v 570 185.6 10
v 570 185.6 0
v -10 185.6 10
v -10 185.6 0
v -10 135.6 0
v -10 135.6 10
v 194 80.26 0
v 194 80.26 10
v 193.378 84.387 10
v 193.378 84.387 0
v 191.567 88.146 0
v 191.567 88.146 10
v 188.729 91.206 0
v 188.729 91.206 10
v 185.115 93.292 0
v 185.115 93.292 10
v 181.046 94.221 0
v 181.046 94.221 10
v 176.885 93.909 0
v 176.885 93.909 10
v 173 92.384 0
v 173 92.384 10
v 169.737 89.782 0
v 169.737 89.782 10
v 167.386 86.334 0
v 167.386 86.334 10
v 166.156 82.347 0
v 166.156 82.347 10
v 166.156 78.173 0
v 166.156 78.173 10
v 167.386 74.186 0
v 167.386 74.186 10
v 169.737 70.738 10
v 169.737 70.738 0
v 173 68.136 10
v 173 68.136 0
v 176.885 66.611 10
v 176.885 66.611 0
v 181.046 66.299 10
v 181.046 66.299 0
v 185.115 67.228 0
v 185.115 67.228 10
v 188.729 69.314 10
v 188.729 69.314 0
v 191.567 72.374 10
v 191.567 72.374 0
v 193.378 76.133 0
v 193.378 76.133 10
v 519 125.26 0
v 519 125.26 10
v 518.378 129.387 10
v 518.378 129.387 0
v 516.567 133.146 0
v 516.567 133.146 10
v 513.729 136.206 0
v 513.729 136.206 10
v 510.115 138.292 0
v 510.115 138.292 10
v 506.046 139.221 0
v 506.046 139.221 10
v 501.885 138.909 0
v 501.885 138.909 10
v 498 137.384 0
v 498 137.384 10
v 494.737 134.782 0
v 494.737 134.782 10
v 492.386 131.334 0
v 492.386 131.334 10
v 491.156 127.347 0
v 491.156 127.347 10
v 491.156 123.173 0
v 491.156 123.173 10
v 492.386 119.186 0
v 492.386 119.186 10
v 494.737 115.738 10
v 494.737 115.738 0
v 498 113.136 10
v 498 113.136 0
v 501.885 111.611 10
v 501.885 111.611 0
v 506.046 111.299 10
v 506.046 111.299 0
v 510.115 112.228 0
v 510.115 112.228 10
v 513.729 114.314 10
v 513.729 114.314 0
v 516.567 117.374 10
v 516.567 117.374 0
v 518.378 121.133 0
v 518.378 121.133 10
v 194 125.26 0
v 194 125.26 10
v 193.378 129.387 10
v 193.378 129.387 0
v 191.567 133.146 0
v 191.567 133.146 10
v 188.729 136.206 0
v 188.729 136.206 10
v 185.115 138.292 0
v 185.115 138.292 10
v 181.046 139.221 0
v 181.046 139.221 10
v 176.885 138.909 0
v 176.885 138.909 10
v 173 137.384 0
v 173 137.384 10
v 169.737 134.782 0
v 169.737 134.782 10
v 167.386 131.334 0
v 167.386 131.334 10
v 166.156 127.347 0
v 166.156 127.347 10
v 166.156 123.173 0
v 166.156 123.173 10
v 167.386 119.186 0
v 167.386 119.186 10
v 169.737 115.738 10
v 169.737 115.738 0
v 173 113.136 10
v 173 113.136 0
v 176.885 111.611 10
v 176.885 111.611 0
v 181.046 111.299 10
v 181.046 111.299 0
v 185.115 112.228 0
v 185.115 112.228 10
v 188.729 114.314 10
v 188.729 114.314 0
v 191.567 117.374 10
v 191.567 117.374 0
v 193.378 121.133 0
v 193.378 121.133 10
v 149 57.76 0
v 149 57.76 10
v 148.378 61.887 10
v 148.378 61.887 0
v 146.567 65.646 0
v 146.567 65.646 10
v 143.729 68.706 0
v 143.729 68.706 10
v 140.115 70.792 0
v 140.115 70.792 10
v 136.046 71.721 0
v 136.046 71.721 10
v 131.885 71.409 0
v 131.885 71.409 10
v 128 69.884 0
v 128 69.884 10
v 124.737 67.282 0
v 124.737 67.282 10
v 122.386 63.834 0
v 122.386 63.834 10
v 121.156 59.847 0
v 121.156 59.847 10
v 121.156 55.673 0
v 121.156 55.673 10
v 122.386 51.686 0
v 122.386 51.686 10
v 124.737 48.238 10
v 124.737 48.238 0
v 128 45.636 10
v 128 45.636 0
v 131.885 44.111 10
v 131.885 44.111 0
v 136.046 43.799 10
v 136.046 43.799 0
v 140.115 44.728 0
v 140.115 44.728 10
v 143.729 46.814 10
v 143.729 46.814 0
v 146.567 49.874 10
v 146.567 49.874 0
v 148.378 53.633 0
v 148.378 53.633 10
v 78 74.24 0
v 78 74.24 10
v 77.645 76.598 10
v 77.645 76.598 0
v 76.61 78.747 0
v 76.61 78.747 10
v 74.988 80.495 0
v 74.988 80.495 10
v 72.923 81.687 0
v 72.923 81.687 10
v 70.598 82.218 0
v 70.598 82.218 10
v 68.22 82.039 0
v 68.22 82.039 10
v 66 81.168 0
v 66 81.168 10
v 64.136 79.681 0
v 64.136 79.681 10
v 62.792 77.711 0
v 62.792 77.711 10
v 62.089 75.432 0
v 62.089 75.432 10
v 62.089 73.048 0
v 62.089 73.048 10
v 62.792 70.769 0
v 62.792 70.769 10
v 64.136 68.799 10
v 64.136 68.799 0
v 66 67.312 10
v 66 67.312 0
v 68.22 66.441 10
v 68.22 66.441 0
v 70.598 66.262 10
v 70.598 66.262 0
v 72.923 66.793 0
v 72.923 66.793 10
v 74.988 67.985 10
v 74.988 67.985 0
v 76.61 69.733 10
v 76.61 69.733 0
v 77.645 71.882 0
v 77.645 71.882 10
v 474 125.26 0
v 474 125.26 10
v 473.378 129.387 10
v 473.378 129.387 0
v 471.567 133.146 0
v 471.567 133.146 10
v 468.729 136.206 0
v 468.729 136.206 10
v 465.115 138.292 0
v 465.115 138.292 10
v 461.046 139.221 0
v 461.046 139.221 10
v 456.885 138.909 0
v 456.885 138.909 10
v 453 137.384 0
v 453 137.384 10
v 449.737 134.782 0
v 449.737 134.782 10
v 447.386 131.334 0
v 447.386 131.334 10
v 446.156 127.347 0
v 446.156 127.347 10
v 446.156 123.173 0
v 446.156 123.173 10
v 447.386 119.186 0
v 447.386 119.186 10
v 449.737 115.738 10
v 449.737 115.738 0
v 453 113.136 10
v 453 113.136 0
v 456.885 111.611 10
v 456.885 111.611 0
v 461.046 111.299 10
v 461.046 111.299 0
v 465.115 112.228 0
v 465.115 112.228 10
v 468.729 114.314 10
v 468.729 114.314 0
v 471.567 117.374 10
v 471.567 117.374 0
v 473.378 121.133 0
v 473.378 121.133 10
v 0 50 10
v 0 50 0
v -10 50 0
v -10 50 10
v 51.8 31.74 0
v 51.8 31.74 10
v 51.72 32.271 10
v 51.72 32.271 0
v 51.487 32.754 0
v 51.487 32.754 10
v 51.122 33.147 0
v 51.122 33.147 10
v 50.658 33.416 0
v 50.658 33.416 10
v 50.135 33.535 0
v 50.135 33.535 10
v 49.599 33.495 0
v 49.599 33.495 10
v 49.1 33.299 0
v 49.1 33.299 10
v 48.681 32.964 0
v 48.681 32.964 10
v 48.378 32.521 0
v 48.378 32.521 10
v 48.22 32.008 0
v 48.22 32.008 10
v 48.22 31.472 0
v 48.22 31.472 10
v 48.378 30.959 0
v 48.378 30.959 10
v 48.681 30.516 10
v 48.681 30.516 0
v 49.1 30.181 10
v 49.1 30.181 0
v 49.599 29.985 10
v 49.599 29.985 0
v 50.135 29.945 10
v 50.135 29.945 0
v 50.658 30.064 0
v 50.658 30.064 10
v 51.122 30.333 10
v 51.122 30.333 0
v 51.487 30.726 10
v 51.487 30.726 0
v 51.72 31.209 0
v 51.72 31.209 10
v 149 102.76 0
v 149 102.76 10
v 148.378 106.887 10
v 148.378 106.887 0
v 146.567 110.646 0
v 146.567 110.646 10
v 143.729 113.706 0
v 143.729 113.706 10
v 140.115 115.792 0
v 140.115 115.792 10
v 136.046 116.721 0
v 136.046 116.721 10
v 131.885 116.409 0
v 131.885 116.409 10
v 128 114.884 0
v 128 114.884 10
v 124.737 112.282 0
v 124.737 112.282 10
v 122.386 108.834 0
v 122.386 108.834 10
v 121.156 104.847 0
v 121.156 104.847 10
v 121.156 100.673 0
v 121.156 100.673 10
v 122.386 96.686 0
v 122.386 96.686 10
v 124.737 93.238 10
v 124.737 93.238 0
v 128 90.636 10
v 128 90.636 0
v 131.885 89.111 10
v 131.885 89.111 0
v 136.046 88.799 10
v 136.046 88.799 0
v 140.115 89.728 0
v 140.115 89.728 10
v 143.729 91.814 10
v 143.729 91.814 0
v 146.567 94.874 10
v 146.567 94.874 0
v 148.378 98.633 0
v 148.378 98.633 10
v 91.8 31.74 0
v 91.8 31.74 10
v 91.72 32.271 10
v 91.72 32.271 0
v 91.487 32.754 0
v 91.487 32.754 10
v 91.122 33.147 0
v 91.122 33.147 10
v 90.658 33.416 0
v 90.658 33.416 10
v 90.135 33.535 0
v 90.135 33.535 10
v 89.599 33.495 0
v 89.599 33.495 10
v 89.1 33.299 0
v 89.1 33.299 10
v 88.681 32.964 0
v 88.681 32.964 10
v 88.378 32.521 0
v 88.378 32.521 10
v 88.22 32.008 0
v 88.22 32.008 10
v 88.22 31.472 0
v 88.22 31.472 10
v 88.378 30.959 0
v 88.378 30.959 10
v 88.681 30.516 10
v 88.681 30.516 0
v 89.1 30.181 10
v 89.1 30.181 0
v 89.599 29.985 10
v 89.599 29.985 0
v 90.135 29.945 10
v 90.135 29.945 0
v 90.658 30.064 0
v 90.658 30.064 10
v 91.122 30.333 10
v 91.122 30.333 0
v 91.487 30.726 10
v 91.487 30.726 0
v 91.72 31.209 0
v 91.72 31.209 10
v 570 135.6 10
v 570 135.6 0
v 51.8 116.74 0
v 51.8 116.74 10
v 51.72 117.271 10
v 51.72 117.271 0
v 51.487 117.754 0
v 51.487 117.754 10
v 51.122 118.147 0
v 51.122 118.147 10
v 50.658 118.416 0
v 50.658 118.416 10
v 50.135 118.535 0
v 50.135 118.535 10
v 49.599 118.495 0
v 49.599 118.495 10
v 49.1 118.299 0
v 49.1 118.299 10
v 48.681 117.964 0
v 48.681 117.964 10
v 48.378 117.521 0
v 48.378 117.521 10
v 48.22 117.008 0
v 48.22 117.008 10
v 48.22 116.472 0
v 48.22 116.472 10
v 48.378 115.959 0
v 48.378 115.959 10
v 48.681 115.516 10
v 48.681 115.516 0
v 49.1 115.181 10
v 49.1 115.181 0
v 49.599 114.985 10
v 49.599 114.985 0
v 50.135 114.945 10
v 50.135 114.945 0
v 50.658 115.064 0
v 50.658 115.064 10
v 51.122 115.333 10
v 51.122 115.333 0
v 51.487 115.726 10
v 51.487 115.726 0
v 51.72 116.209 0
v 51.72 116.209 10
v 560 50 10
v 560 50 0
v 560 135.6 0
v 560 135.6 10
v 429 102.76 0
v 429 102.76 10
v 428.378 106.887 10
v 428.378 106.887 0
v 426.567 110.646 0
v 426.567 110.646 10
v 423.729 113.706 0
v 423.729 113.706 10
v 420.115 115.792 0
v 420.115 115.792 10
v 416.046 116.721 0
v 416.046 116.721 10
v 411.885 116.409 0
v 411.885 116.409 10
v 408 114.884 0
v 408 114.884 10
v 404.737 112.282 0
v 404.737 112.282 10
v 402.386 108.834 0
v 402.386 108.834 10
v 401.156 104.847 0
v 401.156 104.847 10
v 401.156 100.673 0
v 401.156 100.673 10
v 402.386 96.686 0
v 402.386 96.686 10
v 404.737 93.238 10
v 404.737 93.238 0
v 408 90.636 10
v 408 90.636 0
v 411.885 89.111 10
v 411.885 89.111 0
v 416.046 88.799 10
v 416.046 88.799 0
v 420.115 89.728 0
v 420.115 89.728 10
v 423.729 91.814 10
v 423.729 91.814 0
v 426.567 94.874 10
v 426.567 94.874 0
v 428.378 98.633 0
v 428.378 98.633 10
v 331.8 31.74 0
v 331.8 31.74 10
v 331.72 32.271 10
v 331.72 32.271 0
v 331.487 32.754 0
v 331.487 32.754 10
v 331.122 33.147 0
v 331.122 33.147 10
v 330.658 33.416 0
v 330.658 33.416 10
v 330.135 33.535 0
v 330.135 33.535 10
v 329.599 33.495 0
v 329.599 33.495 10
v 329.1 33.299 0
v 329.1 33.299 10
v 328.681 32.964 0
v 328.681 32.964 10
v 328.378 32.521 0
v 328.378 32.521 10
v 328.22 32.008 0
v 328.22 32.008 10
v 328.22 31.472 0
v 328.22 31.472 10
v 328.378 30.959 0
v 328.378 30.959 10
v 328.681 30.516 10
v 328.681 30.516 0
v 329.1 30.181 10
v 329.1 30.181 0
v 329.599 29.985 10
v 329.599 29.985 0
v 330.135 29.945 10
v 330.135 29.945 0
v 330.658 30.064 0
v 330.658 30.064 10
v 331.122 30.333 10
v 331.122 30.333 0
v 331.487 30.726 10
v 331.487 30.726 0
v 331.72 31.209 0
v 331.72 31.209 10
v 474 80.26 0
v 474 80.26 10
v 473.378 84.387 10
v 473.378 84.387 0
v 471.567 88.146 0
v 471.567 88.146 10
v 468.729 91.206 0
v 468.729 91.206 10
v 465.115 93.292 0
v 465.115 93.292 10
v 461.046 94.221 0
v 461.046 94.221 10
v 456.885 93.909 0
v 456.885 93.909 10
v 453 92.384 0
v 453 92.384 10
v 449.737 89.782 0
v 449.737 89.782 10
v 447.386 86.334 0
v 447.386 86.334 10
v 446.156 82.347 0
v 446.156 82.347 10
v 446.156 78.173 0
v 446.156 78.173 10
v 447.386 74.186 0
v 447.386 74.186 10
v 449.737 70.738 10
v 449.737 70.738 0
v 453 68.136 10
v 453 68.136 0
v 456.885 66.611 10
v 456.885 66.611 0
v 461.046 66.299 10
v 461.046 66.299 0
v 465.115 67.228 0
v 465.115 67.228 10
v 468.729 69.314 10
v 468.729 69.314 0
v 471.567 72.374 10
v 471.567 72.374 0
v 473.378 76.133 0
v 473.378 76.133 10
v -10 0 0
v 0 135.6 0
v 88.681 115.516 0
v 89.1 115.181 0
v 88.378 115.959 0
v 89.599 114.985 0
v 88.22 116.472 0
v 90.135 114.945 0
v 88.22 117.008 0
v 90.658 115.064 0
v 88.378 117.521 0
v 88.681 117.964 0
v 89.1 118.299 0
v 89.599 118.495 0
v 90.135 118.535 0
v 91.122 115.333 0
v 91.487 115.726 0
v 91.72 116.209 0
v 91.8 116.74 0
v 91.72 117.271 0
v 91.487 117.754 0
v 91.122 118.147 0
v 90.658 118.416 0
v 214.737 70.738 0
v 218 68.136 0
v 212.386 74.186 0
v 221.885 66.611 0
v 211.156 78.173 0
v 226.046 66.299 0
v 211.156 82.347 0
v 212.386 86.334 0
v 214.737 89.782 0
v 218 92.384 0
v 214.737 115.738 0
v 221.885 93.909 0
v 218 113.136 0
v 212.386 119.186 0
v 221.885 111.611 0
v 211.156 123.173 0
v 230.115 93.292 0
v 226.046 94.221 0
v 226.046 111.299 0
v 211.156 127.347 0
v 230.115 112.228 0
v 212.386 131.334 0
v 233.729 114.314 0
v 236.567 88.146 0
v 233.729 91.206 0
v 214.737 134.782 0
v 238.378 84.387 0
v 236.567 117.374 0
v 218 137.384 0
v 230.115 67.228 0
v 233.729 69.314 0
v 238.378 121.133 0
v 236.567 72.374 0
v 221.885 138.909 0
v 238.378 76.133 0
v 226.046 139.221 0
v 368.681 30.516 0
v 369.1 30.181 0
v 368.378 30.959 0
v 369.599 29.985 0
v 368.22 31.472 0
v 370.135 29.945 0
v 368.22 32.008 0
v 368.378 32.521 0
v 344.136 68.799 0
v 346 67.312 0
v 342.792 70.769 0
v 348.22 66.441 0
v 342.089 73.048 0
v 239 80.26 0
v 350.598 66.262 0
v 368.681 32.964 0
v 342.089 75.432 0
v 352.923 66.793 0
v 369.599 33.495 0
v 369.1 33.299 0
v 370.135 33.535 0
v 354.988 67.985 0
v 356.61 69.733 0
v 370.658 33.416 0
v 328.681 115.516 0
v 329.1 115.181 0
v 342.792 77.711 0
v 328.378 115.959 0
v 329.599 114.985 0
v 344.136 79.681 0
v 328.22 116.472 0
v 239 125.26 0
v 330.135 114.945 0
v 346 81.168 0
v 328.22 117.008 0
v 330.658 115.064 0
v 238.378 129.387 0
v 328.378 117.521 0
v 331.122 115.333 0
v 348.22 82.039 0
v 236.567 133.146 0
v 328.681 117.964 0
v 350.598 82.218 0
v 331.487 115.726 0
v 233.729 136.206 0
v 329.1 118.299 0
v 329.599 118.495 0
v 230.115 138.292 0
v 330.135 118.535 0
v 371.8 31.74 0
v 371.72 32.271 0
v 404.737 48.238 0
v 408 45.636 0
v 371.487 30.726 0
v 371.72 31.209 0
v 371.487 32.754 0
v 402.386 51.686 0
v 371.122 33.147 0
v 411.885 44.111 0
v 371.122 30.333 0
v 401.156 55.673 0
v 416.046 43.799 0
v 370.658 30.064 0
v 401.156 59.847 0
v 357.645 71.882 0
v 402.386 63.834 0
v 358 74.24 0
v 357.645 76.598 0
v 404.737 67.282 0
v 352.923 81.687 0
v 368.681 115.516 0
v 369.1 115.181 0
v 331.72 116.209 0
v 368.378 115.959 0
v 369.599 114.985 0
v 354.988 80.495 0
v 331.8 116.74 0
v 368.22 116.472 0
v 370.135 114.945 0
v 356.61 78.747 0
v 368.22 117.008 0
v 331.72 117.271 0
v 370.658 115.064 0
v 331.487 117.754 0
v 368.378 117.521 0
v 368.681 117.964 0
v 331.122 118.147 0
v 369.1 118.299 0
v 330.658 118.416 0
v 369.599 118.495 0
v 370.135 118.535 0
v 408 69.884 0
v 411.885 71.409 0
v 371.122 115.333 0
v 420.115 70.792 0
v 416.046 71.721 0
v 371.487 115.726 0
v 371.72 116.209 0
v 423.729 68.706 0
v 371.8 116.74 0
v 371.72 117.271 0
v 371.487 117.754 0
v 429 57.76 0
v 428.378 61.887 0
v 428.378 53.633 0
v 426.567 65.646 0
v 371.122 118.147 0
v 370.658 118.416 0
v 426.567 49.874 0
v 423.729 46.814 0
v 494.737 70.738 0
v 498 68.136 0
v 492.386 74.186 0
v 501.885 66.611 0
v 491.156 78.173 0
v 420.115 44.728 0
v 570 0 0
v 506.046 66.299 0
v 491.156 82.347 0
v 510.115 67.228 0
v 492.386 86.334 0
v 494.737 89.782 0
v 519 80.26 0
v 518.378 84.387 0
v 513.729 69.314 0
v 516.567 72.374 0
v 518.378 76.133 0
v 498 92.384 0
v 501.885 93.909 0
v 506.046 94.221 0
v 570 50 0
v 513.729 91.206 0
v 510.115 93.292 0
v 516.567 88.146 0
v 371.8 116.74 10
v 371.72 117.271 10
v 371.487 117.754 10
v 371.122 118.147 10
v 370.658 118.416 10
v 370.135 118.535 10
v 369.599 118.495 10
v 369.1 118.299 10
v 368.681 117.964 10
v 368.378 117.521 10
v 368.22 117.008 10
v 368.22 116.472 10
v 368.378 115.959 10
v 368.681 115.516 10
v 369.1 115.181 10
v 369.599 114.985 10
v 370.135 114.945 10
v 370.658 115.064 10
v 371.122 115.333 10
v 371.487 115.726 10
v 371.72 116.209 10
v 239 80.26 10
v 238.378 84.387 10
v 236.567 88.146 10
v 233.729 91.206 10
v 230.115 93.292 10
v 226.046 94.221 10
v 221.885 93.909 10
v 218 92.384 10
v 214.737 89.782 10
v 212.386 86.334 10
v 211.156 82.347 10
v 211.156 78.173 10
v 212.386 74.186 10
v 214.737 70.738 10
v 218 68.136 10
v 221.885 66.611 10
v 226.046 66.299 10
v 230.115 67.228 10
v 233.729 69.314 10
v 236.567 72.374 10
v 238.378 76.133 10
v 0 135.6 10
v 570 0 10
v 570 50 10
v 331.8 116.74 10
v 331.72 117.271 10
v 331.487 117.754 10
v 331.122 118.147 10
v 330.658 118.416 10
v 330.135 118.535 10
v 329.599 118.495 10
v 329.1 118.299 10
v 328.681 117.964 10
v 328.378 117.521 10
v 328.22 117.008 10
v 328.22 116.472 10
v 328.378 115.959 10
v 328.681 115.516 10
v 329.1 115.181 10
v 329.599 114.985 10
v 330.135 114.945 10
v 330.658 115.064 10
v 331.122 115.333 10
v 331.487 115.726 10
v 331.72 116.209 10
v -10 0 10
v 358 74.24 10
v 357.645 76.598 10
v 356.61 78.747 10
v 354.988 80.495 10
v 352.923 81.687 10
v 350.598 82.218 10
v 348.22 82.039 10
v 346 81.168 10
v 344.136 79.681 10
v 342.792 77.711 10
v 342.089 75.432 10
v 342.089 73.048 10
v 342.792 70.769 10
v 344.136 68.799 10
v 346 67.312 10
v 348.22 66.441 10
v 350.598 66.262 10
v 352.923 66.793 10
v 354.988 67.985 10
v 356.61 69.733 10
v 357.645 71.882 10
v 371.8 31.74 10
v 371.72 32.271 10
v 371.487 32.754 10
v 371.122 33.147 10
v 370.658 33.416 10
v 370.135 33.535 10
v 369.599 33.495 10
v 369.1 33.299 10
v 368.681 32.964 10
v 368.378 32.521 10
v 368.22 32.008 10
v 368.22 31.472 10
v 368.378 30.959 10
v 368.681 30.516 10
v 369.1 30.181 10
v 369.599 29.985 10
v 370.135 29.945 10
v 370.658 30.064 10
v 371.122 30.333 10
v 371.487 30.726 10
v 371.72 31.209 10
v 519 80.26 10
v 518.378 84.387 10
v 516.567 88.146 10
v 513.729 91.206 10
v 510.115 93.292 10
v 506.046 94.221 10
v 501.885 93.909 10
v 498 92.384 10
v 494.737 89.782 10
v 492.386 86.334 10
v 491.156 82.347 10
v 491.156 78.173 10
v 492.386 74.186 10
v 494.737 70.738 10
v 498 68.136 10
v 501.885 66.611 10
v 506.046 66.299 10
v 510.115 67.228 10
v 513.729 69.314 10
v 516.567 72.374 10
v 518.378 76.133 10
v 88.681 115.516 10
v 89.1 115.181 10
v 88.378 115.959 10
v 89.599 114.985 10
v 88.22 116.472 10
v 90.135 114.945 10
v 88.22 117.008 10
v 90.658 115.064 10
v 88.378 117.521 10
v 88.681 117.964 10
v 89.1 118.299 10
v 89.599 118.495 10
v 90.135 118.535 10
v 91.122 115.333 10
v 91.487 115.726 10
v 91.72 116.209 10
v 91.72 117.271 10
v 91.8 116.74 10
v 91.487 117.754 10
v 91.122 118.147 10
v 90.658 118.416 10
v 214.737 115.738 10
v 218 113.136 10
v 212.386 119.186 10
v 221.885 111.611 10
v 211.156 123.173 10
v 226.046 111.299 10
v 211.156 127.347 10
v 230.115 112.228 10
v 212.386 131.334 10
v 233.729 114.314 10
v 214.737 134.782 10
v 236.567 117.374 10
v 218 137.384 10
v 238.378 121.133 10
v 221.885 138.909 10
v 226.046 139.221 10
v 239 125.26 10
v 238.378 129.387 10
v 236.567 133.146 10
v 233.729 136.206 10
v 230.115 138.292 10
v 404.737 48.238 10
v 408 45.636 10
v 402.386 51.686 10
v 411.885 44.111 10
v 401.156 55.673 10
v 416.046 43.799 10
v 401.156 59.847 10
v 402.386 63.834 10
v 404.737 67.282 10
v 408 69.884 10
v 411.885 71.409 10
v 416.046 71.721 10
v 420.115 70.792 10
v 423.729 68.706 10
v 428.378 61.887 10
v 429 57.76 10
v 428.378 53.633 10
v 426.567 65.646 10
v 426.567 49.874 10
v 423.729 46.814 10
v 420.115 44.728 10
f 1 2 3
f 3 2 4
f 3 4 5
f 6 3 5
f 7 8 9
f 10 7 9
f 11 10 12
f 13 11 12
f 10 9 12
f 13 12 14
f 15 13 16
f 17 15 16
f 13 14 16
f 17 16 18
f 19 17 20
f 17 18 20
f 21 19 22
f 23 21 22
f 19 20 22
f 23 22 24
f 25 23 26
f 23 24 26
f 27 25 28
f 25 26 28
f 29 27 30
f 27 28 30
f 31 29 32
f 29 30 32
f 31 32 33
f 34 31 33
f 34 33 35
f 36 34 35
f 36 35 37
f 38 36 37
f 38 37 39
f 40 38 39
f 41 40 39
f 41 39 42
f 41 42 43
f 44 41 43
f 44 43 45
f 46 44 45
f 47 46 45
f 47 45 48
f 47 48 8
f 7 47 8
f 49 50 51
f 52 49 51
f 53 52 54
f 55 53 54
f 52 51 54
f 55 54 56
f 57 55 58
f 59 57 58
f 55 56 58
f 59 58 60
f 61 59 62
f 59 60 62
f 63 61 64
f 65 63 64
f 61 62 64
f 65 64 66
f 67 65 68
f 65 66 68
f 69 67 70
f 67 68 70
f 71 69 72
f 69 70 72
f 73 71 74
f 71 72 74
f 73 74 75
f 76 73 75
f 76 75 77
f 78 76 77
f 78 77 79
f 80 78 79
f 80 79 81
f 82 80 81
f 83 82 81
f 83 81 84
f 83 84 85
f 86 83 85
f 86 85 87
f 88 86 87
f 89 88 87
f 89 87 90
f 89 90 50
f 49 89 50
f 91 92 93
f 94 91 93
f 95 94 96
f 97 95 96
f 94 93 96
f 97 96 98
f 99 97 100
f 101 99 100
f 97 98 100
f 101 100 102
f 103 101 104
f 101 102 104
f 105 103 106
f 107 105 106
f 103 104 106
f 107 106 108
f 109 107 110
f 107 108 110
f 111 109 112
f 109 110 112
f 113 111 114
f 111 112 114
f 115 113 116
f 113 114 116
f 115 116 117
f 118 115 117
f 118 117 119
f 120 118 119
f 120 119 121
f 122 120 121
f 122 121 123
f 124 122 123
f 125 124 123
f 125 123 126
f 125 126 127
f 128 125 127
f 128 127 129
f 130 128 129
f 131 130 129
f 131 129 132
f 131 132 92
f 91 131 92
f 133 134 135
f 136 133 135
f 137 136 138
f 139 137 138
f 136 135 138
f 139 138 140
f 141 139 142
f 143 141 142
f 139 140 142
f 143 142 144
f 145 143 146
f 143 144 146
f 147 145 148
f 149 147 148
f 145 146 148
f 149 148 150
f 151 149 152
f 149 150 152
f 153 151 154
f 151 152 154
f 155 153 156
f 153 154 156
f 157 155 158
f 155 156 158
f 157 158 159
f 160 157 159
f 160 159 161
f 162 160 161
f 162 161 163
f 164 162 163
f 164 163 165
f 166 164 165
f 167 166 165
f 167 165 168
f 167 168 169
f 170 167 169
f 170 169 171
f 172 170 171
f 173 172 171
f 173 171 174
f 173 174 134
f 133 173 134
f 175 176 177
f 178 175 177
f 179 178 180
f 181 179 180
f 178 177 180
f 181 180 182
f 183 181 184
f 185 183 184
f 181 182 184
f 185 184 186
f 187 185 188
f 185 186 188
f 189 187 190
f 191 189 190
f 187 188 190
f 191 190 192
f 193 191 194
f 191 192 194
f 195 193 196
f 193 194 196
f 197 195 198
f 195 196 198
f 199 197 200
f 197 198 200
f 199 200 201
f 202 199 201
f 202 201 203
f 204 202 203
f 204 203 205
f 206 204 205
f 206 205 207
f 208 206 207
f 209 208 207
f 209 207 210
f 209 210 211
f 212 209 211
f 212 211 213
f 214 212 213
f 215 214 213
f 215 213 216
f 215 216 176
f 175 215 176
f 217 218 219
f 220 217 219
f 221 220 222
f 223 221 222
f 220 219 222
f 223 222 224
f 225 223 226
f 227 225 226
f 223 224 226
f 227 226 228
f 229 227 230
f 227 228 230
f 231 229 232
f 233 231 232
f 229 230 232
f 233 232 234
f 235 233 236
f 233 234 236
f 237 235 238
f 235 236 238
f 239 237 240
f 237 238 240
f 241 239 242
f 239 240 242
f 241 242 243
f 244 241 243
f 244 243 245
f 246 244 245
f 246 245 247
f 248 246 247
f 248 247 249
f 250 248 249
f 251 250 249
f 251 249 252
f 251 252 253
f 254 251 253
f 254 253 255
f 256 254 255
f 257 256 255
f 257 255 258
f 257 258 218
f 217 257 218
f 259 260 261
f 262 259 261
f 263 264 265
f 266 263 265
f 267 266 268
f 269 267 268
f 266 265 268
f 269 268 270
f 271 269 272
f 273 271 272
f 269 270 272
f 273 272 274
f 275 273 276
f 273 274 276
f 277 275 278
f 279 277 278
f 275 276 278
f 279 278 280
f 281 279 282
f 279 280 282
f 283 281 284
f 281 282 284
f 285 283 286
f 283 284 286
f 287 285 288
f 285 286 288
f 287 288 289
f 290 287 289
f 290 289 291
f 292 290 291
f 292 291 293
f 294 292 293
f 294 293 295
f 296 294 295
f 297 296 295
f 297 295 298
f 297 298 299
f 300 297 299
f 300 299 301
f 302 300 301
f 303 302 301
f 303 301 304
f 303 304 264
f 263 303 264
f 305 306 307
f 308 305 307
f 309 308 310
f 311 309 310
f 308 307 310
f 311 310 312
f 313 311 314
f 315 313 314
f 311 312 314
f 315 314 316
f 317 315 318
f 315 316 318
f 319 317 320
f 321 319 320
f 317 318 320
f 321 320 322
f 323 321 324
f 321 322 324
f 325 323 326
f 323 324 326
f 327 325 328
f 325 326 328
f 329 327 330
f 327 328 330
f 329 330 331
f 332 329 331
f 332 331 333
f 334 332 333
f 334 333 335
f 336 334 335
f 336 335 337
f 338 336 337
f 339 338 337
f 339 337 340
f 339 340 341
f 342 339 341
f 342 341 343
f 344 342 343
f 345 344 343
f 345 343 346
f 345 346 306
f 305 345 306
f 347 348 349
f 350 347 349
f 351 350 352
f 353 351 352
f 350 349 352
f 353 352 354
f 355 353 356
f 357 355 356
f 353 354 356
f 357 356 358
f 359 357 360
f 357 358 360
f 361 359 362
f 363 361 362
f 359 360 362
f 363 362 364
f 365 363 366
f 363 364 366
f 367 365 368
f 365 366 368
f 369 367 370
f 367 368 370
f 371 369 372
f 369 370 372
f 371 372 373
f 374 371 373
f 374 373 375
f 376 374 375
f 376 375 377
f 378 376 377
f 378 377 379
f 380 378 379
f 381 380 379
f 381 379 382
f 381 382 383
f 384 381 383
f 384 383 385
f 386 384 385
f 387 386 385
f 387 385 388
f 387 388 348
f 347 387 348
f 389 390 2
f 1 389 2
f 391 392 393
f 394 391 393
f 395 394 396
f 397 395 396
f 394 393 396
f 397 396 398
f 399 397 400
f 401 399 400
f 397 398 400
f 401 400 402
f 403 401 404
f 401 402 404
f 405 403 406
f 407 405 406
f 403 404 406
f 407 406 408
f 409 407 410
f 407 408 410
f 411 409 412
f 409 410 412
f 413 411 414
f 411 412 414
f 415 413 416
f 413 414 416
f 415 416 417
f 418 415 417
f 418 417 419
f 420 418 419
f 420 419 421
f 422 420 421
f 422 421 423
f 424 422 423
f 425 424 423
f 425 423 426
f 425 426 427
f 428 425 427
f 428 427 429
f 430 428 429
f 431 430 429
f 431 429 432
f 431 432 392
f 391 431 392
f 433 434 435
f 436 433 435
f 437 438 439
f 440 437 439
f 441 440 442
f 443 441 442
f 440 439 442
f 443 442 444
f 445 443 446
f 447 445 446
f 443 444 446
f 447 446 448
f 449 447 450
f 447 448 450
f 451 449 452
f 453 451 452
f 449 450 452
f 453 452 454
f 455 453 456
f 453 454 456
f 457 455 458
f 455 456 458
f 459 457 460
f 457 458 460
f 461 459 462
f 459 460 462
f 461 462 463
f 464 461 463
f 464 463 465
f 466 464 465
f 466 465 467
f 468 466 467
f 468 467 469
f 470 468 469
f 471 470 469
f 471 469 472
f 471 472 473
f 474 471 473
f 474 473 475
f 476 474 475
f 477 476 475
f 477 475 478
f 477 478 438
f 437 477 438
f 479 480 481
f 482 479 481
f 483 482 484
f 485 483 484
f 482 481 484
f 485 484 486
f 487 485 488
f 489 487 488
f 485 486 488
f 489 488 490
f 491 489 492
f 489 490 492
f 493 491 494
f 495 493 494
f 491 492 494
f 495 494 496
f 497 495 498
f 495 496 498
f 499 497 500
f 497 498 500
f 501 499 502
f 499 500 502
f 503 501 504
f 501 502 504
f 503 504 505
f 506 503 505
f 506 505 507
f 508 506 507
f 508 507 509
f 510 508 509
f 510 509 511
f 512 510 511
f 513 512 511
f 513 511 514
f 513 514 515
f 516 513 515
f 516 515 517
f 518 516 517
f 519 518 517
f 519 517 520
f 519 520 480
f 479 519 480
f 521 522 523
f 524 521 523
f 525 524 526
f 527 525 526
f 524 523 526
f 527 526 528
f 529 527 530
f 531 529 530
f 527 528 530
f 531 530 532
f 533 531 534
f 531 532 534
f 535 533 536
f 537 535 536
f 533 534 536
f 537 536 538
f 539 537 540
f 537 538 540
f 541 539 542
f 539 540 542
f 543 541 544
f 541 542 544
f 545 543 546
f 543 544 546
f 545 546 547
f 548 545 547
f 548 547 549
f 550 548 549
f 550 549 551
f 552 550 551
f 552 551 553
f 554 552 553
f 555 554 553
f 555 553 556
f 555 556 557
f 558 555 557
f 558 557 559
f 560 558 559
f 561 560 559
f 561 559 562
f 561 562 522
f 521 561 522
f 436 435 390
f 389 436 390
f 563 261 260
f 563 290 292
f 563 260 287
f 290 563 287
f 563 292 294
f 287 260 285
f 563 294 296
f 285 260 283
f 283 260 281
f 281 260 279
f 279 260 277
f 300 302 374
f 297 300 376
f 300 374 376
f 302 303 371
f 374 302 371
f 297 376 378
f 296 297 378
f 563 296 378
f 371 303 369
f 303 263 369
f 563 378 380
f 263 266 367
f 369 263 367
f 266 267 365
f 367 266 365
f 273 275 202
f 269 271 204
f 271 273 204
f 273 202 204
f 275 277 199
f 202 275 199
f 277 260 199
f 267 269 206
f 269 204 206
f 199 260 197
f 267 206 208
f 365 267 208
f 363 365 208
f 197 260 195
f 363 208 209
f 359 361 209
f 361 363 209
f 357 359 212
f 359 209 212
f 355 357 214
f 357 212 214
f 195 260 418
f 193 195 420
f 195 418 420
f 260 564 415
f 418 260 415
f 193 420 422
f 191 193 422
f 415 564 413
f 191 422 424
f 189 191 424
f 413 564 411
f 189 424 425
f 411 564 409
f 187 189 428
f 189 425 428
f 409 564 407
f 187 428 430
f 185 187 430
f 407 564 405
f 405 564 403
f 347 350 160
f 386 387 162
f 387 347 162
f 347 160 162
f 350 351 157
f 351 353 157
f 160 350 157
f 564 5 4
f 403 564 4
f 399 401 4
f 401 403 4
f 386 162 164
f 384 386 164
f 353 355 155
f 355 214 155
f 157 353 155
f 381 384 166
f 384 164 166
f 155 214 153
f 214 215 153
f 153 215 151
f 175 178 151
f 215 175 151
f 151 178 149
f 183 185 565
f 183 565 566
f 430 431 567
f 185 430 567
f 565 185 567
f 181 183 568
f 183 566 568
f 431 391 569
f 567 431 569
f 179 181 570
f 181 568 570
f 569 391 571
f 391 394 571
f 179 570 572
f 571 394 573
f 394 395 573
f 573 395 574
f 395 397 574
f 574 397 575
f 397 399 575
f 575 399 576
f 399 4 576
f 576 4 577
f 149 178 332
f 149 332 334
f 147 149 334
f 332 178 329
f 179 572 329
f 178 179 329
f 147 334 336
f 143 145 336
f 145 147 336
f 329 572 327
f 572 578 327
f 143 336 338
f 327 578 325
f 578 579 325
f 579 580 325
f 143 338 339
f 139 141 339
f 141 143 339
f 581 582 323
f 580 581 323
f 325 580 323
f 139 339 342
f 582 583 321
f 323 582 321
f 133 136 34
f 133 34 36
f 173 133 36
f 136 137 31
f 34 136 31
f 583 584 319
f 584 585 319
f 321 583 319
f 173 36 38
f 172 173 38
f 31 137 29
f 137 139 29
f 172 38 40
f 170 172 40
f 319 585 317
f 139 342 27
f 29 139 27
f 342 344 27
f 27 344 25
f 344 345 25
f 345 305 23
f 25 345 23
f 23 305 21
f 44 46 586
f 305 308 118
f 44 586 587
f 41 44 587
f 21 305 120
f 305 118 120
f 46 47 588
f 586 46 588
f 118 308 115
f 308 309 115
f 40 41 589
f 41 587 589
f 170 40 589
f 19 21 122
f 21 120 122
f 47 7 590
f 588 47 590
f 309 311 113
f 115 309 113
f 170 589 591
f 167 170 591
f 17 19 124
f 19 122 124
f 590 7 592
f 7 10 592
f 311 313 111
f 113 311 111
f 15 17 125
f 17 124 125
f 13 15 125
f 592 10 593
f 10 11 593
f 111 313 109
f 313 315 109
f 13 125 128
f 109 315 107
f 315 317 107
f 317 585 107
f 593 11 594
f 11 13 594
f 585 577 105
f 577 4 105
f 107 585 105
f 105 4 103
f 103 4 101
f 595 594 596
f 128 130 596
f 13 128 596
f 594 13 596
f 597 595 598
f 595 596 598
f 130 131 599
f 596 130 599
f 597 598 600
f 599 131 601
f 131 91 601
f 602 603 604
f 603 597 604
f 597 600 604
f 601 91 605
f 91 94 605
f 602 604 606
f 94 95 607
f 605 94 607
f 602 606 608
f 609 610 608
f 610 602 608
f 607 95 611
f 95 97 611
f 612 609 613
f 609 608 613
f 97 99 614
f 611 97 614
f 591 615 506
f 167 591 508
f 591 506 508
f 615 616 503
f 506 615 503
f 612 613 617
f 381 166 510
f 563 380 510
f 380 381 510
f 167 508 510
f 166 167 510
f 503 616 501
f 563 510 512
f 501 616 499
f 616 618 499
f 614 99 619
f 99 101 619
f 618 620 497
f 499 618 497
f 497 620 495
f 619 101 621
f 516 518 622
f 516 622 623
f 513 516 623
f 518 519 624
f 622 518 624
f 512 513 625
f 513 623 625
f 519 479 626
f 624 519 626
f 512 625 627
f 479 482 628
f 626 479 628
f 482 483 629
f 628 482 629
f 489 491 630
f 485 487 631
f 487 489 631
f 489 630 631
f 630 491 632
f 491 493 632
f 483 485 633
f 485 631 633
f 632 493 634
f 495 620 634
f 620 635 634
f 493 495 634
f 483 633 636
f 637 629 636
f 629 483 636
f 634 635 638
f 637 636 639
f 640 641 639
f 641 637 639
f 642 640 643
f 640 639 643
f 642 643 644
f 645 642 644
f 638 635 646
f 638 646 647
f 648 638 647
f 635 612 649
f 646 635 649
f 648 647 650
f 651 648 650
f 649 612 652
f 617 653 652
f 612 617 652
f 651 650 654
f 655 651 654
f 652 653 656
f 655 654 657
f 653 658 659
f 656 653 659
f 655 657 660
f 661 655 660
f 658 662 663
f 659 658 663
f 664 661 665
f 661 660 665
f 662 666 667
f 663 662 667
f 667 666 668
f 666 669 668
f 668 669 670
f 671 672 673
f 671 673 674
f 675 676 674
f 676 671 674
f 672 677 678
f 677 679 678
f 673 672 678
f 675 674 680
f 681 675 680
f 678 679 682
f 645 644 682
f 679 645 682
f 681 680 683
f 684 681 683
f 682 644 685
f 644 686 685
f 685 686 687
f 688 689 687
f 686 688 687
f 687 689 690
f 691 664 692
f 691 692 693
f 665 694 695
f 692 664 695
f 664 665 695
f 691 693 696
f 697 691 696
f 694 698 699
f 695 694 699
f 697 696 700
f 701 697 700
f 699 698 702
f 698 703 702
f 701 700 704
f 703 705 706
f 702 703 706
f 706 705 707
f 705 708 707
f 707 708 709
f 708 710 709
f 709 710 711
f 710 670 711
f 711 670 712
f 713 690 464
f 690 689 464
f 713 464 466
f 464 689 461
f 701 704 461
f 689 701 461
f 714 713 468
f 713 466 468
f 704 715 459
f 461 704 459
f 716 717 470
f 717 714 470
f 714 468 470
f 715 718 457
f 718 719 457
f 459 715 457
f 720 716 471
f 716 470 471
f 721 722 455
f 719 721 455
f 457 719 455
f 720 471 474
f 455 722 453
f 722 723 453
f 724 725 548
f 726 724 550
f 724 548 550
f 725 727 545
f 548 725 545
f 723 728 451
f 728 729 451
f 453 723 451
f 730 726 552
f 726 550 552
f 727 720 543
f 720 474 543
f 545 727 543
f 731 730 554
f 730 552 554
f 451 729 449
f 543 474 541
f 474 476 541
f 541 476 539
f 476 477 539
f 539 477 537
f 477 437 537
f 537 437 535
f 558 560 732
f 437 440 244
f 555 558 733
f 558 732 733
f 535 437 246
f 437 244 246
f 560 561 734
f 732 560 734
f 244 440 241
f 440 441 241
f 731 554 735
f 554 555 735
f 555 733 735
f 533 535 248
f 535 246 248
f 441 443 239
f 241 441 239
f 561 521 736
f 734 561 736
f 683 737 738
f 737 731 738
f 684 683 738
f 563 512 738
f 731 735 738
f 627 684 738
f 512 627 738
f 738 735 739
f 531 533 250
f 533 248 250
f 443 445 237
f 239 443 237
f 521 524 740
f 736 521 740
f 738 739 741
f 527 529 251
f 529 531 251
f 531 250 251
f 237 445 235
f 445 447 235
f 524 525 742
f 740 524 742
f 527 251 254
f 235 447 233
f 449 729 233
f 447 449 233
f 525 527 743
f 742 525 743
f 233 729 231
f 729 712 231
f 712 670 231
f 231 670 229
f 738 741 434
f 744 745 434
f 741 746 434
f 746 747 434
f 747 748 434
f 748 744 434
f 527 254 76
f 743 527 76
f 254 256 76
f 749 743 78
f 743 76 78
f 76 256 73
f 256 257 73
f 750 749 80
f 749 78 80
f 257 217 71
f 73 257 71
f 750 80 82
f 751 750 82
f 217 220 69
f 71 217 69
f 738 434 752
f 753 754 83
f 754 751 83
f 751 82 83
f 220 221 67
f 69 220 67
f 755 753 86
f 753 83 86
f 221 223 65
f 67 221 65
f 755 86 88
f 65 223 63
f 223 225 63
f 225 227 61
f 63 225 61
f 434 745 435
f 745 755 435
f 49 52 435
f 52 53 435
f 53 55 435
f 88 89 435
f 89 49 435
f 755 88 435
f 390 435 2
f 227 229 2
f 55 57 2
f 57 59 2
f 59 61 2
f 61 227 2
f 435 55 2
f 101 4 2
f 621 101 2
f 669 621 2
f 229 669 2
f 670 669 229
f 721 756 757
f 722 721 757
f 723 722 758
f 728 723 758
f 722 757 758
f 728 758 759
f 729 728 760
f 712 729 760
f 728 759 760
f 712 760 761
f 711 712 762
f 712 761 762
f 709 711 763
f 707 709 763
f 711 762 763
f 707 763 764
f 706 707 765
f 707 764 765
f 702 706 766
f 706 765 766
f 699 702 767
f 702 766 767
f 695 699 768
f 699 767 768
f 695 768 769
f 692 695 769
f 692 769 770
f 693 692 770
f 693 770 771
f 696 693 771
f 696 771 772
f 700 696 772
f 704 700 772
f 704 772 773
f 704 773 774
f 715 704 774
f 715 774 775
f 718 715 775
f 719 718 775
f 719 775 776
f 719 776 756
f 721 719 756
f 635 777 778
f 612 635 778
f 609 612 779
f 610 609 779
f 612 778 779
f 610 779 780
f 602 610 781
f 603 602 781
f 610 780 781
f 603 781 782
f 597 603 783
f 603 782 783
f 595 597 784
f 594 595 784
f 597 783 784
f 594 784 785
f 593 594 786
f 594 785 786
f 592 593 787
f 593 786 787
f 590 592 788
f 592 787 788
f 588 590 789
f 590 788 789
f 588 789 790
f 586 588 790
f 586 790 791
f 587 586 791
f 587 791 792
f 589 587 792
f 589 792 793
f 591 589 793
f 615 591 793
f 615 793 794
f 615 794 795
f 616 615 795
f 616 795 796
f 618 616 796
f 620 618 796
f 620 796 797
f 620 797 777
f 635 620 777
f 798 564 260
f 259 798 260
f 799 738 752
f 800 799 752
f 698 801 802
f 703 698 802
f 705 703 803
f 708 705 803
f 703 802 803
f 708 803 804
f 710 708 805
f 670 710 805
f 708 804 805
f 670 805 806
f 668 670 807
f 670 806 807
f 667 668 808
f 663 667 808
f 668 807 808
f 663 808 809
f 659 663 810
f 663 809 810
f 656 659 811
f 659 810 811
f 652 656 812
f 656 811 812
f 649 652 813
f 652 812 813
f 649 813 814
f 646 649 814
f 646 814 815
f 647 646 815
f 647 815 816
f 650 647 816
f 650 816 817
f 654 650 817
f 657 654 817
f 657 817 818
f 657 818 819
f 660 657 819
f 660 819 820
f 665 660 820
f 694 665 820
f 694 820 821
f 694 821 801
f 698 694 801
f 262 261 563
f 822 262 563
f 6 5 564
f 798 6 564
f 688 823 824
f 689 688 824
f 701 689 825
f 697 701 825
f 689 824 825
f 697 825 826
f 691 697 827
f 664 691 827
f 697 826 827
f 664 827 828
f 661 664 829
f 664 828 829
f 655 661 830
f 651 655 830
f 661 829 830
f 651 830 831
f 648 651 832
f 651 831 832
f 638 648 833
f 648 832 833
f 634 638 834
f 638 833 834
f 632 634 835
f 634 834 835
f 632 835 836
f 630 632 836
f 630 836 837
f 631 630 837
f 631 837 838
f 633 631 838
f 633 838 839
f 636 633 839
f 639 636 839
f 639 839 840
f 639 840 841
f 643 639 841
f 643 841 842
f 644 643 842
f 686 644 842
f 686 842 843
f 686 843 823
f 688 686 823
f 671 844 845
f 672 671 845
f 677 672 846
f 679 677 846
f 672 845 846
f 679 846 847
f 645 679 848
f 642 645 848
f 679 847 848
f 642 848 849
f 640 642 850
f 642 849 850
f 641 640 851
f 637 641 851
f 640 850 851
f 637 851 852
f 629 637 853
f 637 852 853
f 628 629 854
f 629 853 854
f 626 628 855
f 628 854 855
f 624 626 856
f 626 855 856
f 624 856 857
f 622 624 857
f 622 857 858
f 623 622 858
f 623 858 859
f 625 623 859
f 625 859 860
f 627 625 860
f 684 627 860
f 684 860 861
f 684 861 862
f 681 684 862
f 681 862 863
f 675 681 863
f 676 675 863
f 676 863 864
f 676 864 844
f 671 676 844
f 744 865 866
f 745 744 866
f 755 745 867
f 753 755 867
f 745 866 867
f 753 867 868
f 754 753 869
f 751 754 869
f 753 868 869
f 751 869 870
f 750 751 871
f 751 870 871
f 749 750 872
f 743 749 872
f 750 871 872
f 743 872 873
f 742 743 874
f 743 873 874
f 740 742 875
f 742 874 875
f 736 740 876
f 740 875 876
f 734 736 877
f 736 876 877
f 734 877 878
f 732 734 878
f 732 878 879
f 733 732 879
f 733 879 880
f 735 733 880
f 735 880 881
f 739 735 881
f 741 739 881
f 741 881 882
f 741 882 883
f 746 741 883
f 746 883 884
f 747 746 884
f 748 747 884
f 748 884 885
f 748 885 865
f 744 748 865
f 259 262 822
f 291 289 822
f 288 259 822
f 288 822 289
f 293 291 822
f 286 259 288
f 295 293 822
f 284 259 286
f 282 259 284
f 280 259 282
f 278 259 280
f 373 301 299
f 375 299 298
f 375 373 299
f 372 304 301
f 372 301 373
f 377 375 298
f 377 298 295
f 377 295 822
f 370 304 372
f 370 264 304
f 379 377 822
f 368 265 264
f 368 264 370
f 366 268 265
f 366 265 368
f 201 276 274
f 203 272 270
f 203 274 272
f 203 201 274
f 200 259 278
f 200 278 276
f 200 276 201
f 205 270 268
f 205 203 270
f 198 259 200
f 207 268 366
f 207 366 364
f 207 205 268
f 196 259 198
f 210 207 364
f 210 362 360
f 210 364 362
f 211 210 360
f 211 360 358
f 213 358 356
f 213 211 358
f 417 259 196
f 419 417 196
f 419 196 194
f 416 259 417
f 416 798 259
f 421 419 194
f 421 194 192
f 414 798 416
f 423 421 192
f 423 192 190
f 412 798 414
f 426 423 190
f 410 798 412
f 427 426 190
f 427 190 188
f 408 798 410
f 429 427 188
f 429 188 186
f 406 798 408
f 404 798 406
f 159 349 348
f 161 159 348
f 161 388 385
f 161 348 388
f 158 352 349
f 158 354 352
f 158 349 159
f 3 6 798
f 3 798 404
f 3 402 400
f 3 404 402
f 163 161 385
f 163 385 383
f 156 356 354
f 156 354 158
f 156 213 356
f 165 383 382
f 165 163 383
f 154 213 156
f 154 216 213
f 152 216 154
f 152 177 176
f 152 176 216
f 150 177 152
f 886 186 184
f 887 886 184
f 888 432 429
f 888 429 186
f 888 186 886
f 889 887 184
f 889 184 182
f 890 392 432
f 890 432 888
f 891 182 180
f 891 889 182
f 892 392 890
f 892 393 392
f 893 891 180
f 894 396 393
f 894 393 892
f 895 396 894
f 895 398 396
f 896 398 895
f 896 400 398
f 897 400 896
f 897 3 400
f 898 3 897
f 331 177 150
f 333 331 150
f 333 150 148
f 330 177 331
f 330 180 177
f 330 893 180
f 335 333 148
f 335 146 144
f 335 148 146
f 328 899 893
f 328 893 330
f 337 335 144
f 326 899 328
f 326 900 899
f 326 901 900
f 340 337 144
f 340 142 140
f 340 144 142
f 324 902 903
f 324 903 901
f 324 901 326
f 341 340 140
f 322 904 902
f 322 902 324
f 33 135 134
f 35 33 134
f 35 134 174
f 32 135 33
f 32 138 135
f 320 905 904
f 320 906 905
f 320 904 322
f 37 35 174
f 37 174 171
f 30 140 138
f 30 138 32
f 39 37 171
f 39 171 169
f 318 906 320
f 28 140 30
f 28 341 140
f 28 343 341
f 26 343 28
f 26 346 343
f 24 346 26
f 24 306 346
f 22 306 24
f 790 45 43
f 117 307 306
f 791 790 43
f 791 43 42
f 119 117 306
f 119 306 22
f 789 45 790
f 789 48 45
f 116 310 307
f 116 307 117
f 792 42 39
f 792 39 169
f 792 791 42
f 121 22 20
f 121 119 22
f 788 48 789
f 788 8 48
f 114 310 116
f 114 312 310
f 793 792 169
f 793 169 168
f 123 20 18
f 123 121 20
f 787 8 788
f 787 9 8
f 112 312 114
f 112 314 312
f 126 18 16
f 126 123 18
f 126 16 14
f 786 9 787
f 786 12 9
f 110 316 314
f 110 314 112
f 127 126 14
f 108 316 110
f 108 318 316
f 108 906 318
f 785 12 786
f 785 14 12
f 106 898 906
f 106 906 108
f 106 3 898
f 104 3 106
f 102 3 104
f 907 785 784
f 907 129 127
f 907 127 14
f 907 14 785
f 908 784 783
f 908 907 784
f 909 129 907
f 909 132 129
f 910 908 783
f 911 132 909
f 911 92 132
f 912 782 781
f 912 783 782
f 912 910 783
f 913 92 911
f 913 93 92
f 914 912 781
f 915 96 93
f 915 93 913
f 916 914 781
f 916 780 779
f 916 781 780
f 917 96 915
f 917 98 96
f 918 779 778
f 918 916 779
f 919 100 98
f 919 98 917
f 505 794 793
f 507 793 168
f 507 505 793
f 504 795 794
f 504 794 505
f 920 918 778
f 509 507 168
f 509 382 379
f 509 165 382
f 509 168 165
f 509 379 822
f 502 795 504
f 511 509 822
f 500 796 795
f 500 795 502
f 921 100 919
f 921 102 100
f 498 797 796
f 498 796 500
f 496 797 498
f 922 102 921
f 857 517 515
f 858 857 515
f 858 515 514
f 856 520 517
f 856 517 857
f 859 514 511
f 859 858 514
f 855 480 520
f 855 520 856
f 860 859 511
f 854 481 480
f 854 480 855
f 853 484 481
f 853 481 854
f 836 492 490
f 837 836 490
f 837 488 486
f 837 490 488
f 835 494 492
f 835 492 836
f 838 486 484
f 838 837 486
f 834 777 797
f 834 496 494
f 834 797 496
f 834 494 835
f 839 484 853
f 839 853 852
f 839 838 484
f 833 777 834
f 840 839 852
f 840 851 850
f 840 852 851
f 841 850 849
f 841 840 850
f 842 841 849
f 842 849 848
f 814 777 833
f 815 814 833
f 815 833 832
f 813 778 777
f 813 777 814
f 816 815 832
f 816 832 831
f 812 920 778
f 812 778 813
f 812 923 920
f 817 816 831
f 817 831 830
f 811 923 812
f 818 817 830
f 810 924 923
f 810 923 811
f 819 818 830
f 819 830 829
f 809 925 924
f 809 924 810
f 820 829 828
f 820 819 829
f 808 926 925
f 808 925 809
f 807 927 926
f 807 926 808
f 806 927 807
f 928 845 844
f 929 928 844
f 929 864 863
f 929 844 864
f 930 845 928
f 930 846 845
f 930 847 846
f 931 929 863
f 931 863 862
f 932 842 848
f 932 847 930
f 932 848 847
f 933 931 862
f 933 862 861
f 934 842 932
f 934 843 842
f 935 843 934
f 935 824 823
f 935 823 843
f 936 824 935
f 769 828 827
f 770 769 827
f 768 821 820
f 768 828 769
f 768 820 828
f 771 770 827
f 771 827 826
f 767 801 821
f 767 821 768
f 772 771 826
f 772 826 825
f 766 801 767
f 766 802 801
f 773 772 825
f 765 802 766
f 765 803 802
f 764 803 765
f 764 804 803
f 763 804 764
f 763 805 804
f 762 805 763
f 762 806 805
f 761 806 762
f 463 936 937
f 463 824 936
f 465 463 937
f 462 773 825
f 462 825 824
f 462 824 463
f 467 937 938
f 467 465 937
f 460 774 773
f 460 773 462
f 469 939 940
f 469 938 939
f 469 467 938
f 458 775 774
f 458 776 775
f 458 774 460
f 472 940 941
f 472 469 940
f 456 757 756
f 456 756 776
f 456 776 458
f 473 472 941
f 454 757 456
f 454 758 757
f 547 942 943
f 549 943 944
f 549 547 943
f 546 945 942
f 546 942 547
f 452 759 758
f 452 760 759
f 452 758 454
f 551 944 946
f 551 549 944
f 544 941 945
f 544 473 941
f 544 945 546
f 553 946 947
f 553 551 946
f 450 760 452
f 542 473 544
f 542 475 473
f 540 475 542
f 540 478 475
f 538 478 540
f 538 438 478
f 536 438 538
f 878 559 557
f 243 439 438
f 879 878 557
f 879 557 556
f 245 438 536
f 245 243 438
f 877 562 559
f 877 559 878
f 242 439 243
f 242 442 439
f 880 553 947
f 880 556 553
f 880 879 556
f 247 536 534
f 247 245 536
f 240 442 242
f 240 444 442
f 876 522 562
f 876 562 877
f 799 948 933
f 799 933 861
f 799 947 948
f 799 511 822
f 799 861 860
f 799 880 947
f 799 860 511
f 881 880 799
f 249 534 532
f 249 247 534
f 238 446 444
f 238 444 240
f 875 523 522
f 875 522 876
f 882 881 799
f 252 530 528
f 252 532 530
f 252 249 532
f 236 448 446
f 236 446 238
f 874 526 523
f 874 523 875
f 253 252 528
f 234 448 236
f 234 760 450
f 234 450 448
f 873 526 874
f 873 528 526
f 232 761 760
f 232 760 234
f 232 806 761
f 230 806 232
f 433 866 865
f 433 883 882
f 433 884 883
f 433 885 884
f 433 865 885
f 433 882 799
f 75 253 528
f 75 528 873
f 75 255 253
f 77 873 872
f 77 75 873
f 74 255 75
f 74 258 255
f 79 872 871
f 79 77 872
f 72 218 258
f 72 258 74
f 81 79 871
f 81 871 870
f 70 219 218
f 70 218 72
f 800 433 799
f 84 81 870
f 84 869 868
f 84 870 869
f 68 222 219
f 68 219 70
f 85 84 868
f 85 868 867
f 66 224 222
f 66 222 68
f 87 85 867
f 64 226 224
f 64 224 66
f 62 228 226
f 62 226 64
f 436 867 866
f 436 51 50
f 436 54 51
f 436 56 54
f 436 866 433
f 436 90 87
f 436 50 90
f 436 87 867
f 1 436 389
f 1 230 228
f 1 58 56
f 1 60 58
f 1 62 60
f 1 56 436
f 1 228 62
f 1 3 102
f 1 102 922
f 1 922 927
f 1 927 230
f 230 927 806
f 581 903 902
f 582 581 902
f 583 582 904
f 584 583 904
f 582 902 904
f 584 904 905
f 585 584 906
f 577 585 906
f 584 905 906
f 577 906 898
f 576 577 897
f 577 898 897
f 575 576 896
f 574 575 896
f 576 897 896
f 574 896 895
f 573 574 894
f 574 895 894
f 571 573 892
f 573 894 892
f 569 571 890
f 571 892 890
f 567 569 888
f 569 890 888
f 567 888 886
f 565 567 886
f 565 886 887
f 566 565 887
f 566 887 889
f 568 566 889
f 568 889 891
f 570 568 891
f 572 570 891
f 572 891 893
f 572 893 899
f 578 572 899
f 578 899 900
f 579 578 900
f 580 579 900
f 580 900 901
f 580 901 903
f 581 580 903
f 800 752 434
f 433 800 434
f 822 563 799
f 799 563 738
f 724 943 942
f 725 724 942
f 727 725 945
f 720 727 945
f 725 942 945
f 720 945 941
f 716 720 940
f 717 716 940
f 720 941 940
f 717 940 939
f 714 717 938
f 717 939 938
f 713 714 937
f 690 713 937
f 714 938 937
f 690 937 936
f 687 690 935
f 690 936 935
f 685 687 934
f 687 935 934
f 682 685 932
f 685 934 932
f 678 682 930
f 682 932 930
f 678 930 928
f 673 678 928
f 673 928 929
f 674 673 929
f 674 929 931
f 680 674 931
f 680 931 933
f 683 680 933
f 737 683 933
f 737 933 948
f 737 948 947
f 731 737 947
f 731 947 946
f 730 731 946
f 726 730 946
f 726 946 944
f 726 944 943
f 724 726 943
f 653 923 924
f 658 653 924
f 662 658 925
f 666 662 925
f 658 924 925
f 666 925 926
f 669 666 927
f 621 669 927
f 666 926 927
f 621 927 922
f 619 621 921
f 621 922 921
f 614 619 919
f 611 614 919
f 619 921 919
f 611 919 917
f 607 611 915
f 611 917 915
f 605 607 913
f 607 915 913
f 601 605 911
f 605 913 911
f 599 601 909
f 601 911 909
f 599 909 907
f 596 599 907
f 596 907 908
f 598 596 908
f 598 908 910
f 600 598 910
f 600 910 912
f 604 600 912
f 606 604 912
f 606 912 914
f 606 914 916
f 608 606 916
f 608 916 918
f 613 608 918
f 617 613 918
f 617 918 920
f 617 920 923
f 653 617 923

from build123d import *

# Parameters (mm, degrees)
PAD_DEPTH     = 10
SKETCH001_R   = 8
SKETCH001_R_2 = 14
SKETCH001_R_3 = 1.8
POCKET_DEPTH  = 10.001


with BuildPart() as part:
    # Sketch → Pad (new body)
    with BuildSketch(Plane.XY):
        Polygon((0, 0), (560, 0), (570, 0), (570, 50), (560, 50), (560, 135.6), (570, 135.6), (570, 185.6), (560, 185.6), (0, 185.6), (-10, 185.6), (-10, 135.6), (0, 135.6), (0, 50), (-10, 50), (-10, 0), align=None)
    extrude(amount=PAD_DEPTH)

    # Sketch001 → Pocket (cut, through all)
    with BuildSketch(Plane.XY.offset(10)):
        with Locations((70, 74.24)):
            Circle(SKETCH001_R)
        with Locations((135, 102.76)):
            Circle(SKETCH001_R_2)
        with Locations((180, 125.26)):
            Circle(SKETCH001_R_2)
        with Locations((225, 125.26)):
            Circle(SKETCH001_R_2)
        with Locations((135, 57.76)):
            Circle(SKETCH001_R_2)
        with Locations((180, 80.26)):
            Circle(SKETCH001_R_2)
        with Locations((225, 80.26)):
            Circle(SKETCH001_R_2)
        with Locations((350, 74.24)):
            Circle(SKETCH001_R)
        with Locations((415, 102.76)):
            Circle(SKETCH001_R_2)
        with Locations((460, 125.26)):
            Circle(SKETCH001_R_2)
        with Locations((505, 125.26)):
            Circle(SKETCH001_R_2)
        with Locations((505, 80.26)):
            Circle(SKETCH001_R_2)
        with Locations((460, 80.26)):
            Circle(SKETCH001_R_2)
        with Locations((415, 57.76)):
            Circle(SKETCH001_R_2)
        with Locations((50, 116.74)):
            Circle(SKETCH001_R_3)
        with Locations((90, 116.74)):
            Circle(SKETCH001_R_3)
        with Locations((50, 31.74)):
            Circle(SKETCH001_R_3)
        with Locations((90, 31.74)):
            Circle(SKETCH001_R_3)
        with Locations((330, 116.74)):
            Circle(SKETCH001_R_3)
        with Locations((370, 116.74)):
            Circle(SKETCH001_R_3)
        with Locations((370, 31.74)):
            Circle(SKETCH001_R_3)
        with Locations((330, 31.74)):
            Circle(SKETCH001_R_3)
    extrude(amount=-POCKET_DEPTH, mode=Mode.SUBTRACT)


solid = part.part
